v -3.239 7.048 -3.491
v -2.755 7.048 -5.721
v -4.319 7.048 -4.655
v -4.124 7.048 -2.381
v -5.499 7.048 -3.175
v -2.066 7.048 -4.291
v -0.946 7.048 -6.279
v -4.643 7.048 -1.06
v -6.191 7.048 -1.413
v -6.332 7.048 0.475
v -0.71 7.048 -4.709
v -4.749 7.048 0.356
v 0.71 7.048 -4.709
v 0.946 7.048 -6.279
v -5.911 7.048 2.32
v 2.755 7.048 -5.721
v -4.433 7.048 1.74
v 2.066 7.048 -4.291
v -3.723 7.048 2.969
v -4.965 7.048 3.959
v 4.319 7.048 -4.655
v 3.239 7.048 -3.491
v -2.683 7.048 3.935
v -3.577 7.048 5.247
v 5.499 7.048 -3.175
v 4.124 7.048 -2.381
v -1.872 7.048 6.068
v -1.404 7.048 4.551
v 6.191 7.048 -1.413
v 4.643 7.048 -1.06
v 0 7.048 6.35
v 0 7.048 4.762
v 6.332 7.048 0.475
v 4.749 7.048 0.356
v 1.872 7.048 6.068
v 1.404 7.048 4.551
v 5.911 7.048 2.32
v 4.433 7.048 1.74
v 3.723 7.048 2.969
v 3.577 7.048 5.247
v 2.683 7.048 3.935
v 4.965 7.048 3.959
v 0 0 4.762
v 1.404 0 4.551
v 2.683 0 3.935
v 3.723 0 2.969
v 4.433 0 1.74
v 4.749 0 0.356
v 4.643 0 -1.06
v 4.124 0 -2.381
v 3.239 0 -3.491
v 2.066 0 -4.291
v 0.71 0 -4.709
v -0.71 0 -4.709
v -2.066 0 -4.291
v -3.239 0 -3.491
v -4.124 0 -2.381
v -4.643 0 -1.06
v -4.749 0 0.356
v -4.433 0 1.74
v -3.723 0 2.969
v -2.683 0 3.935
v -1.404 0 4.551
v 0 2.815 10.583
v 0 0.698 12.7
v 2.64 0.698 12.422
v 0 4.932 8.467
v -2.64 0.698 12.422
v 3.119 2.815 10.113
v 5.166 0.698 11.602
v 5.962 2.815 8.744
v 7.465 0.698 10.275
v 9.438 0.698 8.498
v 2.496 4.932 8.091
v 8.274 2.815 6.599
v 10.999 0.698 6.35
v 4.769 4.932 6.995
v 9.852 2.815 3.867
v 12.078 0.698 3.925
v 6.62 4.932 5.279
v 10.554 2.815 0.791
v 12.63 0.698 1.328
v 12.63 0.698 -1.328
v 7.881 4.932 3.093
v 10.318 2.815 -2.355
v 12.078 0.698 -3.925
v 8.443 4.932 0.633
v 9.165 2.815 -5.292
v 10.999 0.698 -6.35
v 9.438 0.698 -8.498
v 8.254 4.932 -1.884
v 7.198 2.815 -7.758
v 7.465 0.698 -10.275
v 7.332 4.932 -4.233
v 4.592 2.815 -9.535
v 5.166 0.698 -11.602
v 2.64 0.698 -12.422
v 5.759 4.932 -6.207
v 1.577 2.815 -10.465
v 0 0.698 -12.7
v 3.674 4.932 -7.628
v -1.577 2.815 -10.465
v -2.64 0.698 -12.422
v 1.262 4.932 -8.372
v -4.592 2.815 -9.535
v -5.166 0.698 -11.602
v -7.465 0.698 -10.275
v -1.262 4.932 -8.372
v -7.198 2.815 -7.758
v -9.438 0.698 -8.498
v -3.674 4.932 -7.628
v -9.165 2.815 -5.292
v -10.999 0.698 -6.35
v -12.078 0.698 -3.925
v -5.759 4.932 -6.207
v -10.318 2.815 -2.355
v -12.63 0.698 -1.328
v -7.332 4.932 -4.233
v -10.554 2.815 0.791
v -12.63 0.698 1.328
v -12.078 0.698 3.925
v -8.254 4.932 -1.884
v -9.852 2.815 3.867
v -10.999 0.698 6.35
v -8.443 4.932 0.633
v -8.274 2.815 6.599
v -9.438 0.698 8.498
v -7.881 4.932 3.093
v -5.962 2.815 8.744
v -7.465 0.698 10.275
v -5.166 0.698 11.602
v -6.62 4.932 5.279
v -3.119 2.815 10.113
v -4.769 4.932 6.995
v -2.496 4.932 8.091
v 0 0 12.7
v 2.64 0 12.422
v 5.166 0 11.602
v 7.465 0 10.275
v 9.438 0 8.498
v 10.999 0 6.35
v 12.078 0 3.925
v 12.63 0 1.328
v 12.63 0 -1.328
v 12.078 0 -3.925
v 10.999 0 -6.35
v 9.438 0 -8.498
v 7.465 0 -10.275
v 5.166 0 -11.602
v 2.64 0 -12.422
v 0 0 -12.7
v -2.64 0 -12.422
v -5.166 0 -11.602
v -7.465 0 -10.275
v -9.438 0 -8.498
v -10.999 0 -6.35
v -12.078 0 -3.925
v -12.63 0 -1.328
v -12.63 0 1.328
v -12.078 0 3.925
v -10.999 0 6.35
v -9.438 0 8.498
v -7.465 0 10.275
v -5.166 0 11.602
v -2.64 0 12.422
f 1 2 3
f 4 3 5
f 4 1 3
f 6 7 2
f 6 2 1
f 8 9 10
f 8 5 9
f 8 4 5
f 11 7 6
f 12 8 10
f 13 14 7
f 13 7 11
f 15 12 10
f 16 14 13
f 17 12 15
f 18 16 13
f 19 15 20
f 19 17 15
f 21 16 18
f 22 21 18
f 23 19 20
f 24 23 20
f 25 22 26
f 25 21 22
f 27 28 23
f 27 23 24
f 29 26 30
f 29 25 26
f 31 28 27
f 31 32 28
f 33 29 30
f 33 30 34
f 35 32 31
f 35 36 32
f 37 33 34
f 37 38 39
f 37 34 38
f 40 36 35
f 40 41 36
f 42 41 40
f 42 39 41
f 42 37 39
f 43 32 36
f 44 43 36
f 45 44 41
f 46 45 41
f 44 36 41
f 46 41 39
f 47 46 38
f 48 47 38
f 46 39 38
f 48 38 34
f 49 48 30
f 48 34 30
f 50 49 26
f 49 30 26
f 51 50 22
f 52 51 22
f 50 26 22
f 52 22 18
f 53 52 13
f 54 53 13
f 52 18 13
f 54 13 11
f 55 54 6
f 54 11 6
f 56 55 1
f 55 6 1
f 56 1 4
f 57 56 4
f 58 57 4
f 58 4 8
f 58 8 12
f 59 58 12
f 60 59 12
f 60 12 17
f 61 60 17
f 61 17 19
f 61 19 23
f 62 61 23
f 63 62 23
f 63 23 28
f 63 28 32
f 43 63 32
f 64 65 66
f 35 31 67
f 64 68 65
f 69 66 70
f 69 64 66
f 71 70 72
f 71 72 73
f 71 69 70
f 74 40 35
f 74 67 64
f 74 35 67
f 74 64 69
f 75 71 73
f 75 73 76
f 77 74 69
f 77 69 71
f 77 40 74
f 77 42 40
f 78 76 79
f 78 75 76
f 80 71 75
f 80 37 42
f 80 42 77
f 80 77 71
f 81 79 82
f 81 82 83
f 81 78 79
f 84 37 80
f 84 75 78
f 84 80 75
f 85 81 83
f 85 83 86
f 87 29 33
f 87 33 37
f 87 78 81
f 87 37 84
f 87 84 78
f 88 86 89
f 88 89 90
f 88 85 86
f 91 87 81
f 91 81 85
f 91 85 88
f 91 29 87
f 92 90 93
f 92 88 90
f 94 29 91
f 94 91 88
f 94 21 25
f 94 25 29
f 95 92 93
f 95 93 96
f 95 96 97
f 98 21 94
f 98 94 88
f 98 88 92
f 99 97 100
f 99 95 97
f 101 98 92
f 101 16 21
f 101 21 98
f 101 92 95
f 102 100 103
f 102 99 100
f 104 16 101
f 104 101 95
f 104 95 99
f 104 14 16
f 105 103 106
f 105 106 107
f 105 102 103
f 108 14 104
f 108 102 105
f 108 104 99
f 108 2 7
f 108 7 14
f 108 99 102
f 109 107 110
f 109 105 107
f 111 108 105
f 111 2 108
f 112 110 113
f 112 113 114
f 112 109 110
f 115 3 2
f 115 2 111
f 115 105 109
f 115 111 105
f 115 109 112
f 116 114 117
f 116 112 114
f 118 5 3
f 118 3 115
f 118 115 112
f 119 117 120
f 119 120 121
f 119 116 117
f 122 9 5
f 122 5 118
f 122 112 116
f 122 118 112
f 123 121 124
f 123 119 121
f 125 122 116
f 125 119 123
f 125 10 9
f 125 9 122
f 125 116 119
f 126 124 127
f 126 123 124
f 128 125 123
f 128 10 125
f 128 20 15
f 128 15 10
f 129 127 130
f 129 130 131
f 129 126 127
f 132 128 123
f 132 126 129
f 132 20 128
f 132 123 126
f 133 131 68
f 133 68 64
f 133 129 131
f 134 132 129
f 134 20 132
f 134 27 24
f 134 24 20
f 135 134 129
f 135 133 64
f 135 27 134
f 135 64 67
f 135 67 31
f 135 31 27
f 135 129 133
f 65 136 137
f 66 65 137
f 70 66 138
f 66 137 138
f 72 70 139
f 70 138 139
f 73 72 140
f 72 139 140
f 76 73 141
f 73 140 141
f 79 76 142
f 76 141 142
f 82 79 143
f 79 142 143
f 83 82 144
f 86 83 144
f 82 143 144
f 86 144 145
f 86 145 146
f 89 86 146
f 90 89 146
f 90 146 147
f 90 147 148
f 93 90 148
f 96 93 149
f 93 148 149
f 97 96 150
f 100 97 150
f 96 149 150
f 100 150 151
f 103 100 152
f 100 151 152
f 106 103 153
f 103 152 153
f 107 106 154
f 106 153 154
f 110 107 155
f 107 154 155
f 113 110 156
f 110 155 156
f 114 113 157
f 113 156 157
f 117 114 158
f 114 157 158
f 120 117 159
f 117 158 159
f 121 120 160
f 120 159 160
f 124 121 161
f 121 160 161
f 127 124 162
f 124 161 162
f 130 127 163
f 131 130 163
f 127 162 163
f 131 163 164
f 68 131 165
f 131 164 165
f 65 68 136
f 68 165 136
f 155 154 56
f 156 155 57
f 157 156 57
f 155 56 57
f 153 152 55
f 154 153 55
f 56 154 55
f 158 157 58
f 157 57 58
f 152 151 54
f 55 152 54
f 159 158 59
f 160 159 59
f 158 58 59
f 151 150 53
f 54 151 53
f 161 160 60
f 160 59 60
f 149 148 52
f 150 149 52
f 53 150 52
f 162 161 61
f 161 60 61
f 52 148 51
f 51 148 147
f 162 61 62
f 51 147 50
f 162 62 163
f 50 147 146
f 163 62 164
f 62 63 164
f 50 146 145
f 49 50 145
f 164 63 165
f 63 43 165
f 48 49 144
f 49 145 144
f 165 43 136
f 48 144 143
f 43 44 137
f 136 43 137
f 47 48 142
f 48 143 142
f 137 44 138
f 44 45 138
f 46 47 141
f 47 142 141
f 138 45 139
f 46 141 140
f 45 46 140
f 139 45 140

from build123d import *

# Parameters (mm, degrees)
SKETCH1_R           = 12.7
BOSS_EXTRUDE1_DEPTH = 0.6985
SKETCH2_R           = 12.7
BOSS_EXTRUDE2_DEPTH = 6.35
BOSS_EXTRUDE2_TAPER = 45
SKETCH3_R           = 4.7625
CUT_EXTRUDE1_DEPTH  = 20.294075706


with BuildPart() as part:
    # Sketch1 → Boss-Extrude1 (new body)
    with BuildSketch(Plane(origin=(0, 0, 0), x_dir=(1, 0, 0), z_dir=(0, 1, 0))):
        with Locations(Location((0, 0, 0), (0, 0, 270))):
            Circle(SKETCH1_R)
    extrude(amount=BOSS_EXTRUDE1_DEPTH)

    # Sketch2 → Boss-Extrude2 (add)
    with BuildSketch(Plane(origin=(0, 0.6985, 0), x_dir=(1, 0, 0), z_dir=(0, 1, 0))):
        with Locations(Location((0, 0, 0), (0, 0, 270))):
            Circle(SKETCH2_R)
    extrude(amount=BOSS_EXTRUDE2_DEPTH, taper=BOSS_EXTRUDE2_TAPER)

    # Sketch3 → Cut-Extrude1 (cut, through all)
    with BuildSketch(Plane(origin=(0, 7.0485, 0), x_dir=(1, 0, 0), z_dir=(0, 1, 0))):
        with Locations(Location((0, 0, 0), (0, 0, 270))):
            Circle(SKETCH3_R)
    extrude(amount=-CUT_EXTRUDE1_DEPTH, mode=Mode.SUBTRACT)


solid = part.part
